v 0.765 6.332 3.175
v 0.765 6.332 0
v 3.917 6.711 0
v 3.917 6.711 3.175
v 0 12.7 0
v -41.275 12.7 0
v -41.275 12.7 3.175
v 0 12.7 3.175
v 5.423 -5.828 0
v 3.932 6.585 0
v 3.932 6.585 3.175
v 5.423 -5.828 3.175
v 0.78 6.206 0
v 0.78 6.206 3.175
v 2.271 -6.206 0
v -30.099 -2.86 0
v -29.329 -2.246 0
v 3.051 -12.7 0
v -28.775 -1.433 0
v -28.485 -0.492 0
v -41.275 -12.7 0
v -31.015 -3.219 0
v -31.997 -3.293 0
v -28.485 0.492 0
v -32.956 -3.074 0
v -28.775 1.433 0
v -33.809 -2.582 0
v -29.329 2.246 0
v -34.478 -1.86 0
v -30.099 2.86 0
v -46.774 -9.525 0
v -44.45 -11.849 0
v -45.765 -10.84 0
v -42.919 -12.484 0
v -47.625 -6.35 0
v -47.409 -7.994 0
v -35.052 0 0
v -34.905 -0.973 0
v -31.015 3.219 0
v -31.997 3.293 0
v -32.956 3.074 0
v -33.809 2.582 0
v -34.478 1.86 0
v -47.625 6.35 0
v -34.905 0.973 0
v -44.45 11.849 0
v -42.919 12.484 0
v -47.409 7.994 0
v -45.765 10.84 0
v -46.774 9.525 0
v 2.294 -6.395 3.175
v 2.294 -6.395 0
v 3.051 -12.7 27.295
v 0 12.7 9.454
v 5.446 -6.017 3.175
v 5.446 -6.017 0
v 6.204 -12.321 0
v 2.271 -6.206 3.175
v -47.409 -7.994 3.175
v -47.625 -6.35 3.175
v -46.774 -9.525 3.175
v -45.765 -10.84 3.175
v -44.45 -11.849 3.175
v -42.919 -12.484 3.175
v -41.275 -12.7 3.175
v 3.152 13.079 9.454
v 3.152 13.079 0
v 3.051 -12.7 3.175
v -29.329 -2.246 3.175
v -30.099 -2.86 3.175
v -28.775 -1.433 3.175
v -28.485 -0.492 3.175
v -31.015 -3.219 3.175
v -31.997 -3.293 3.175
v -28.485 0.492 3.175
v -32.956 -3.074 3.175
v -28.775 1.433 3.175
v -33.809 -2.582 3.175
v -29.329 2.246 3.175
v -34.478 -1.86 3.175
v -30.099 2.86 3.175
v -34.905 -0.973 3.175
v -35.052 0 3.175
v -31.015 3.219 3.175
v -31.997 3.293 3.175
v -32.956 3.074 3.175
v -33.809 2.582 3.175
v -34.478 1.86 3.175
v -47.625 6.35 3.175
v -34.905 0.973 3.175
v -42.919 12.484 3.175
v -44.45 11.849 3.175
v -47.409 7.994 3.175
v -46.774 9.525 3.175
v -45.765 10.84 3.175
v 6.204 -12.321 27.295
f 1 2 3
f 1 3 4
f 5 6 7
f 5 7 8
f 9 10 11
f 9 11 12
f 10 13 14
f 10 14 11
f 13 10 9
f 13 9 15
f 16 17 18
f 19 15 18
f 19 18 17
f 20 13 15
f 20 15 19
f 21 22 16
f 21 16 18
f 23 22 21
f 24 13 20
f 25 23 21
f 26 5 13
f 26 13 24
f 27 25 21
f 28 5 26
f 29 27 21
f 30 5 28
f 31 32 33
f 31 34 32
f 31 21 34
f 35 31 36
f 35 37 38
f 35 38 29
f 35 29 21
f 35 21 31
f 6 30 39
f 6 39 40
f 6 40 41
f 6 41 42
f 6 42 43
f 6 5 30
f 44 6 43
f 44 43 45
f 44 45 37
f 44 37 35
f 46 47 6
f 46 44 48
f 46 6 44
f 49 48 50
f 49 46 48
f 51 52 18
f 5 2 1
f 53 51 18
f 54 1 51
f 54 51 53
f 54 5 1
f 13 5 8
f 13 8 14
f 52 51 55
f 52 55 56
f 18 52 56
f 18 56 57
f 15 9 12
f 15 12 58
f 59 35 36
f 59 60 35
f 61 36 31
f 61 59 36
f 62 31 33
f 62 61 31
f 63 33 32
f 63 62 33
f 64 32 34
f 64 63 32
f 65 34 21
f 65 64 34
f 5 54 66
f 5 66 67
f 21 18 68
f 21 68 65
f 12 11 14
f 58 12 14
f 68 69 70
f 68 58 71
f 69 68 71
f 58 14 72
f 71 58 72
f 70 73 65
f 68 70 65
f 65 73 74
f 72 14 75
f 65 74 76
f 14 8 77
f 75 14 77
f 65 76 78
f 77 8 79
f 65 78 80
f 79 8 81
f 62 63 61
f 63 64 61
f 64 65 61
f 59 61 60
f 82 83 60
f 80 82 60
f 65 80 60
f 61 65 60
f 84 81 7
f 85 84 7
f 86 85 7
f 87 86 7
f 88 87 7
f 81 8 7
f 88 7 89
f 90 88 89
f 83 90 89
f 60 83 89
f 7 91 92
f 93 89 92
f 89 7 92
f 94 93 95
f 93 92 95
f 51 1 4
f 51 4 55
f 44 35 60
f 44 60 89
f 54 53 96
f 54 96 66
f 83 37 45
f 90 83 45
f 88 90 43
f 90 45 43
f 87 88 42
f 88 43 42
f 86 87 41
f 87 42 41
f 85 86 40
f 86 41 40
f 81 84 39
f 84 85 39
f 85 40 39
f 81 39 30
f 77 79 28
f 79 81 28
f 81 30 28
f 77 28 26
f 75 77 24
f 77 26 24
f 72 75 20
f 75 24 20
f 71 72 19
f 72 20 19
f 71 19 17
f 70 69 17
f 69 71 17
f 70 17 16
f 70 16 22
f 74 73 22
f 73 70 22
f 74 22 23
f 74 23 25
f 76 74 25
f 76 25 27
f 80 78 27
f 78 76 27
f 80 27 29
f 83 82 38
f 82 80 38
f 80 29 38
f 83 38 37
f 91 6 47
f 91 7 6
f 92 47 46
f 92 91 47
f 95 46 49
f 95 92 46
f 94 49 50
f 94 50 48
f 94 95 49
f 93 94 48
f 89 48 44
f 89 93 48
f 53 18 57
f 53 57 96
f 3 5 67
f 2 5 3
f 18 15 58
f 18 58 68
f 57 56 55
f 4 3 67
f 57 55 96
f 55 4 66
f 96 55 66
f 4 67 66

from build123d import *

# Parameters (mm, degrees)
BOSS_EXTRUDE1_DEPTH     = 3.175
CUT_EXTRUDE1_DEPTH      = 50.391408666
CUT_EXTRUDE1_DEPTH_BACK = 50.391408666
SKETCH3_R               = 3.302
BOSS_EXTRUDE2_DEPTH     = 3.175
FILLET1_R               = 6.35


with BuildPart() as part:
    # Sketch1 → Boss-Extrude1 (new body)
    with BuildSketch(Plane.XY):
        Polygon((0, 12.7), (-3.051249826, -12.7), (0, -12.7), (47.625, -12.7), (47.625, 12.7), align=None)
        Polygon((-2.271161455, -6.206187377), (-0.780088372, 6.206187377), (-3.932424596, 6.584871053), (-5.42349768, -5.827503701), align=None)
    extrude(amount=BOSS_EXTRUDE1_DEPTH)

    # Sketch3 → Cut-Extrude1 (cut, two sides: drawn at the far end of the back side and taken through both)
    with BuildSketch(Plane.XY.offset(3.175).offset(-CUT_EXTRUDE1_DEPTH_BACK)):
        with Locations((31.75, 0)):
            Circle(SKETCH3_R)
    extrude(amount=CUT_EXTRUDE1_DEPTH + CUT_EXTRUDE1_DEPTH_BACK, mode=Mode.SUBTRACT)

    # Fillet1
    fillet1_edges = [part.edges().sort_by_distance(p)[0] for p in [
        (47.625, 12.7, 1.5875),
        (47.625, -12.7, 1.5875),
    ]]
    fillet(fillet1_edges, radius=FILLET1_R)


with BuildPart() as body_2:
    # Sketch2 → Boss-Extrude2 (new body)
    with BuildSketch(Plane(origin=(-1.503922228, 0.180663088, 0), x_dir=(0, 0, 1), z_dir=(-0.9928618030717177, 0.11927044898539502, 0))):
        Polygon((0, 12.609344899), (0, 6.195844899), (3.175, 6.195844899), (3.175, -6.623268836), (0, -6.623268836), (0, -12.973268836), (27.295308913, -12.973268836), (9.453791039, 12.609344899), align=None)
    extrude(amount=BOSS_EXTRUDE2_DEPTH)


with BuildPart() as body_3:
    # Mirror2: mirrored copy
    add(body_2.part.mirror(Plane(origin=(0, 0, 0), x_dir=(0, 0, 1), z_dir=(1, 0, 0))))


with BuildPart() as body_4:
    # Mirror2 2: mirrored copy
    add(part.part.mirror(Plane(origin=(0, 0, 0), x_dir=(0, 0, 1), z_dir=(1, 0, 0))))


solid = Compound([body_3.part, body_4.part])
